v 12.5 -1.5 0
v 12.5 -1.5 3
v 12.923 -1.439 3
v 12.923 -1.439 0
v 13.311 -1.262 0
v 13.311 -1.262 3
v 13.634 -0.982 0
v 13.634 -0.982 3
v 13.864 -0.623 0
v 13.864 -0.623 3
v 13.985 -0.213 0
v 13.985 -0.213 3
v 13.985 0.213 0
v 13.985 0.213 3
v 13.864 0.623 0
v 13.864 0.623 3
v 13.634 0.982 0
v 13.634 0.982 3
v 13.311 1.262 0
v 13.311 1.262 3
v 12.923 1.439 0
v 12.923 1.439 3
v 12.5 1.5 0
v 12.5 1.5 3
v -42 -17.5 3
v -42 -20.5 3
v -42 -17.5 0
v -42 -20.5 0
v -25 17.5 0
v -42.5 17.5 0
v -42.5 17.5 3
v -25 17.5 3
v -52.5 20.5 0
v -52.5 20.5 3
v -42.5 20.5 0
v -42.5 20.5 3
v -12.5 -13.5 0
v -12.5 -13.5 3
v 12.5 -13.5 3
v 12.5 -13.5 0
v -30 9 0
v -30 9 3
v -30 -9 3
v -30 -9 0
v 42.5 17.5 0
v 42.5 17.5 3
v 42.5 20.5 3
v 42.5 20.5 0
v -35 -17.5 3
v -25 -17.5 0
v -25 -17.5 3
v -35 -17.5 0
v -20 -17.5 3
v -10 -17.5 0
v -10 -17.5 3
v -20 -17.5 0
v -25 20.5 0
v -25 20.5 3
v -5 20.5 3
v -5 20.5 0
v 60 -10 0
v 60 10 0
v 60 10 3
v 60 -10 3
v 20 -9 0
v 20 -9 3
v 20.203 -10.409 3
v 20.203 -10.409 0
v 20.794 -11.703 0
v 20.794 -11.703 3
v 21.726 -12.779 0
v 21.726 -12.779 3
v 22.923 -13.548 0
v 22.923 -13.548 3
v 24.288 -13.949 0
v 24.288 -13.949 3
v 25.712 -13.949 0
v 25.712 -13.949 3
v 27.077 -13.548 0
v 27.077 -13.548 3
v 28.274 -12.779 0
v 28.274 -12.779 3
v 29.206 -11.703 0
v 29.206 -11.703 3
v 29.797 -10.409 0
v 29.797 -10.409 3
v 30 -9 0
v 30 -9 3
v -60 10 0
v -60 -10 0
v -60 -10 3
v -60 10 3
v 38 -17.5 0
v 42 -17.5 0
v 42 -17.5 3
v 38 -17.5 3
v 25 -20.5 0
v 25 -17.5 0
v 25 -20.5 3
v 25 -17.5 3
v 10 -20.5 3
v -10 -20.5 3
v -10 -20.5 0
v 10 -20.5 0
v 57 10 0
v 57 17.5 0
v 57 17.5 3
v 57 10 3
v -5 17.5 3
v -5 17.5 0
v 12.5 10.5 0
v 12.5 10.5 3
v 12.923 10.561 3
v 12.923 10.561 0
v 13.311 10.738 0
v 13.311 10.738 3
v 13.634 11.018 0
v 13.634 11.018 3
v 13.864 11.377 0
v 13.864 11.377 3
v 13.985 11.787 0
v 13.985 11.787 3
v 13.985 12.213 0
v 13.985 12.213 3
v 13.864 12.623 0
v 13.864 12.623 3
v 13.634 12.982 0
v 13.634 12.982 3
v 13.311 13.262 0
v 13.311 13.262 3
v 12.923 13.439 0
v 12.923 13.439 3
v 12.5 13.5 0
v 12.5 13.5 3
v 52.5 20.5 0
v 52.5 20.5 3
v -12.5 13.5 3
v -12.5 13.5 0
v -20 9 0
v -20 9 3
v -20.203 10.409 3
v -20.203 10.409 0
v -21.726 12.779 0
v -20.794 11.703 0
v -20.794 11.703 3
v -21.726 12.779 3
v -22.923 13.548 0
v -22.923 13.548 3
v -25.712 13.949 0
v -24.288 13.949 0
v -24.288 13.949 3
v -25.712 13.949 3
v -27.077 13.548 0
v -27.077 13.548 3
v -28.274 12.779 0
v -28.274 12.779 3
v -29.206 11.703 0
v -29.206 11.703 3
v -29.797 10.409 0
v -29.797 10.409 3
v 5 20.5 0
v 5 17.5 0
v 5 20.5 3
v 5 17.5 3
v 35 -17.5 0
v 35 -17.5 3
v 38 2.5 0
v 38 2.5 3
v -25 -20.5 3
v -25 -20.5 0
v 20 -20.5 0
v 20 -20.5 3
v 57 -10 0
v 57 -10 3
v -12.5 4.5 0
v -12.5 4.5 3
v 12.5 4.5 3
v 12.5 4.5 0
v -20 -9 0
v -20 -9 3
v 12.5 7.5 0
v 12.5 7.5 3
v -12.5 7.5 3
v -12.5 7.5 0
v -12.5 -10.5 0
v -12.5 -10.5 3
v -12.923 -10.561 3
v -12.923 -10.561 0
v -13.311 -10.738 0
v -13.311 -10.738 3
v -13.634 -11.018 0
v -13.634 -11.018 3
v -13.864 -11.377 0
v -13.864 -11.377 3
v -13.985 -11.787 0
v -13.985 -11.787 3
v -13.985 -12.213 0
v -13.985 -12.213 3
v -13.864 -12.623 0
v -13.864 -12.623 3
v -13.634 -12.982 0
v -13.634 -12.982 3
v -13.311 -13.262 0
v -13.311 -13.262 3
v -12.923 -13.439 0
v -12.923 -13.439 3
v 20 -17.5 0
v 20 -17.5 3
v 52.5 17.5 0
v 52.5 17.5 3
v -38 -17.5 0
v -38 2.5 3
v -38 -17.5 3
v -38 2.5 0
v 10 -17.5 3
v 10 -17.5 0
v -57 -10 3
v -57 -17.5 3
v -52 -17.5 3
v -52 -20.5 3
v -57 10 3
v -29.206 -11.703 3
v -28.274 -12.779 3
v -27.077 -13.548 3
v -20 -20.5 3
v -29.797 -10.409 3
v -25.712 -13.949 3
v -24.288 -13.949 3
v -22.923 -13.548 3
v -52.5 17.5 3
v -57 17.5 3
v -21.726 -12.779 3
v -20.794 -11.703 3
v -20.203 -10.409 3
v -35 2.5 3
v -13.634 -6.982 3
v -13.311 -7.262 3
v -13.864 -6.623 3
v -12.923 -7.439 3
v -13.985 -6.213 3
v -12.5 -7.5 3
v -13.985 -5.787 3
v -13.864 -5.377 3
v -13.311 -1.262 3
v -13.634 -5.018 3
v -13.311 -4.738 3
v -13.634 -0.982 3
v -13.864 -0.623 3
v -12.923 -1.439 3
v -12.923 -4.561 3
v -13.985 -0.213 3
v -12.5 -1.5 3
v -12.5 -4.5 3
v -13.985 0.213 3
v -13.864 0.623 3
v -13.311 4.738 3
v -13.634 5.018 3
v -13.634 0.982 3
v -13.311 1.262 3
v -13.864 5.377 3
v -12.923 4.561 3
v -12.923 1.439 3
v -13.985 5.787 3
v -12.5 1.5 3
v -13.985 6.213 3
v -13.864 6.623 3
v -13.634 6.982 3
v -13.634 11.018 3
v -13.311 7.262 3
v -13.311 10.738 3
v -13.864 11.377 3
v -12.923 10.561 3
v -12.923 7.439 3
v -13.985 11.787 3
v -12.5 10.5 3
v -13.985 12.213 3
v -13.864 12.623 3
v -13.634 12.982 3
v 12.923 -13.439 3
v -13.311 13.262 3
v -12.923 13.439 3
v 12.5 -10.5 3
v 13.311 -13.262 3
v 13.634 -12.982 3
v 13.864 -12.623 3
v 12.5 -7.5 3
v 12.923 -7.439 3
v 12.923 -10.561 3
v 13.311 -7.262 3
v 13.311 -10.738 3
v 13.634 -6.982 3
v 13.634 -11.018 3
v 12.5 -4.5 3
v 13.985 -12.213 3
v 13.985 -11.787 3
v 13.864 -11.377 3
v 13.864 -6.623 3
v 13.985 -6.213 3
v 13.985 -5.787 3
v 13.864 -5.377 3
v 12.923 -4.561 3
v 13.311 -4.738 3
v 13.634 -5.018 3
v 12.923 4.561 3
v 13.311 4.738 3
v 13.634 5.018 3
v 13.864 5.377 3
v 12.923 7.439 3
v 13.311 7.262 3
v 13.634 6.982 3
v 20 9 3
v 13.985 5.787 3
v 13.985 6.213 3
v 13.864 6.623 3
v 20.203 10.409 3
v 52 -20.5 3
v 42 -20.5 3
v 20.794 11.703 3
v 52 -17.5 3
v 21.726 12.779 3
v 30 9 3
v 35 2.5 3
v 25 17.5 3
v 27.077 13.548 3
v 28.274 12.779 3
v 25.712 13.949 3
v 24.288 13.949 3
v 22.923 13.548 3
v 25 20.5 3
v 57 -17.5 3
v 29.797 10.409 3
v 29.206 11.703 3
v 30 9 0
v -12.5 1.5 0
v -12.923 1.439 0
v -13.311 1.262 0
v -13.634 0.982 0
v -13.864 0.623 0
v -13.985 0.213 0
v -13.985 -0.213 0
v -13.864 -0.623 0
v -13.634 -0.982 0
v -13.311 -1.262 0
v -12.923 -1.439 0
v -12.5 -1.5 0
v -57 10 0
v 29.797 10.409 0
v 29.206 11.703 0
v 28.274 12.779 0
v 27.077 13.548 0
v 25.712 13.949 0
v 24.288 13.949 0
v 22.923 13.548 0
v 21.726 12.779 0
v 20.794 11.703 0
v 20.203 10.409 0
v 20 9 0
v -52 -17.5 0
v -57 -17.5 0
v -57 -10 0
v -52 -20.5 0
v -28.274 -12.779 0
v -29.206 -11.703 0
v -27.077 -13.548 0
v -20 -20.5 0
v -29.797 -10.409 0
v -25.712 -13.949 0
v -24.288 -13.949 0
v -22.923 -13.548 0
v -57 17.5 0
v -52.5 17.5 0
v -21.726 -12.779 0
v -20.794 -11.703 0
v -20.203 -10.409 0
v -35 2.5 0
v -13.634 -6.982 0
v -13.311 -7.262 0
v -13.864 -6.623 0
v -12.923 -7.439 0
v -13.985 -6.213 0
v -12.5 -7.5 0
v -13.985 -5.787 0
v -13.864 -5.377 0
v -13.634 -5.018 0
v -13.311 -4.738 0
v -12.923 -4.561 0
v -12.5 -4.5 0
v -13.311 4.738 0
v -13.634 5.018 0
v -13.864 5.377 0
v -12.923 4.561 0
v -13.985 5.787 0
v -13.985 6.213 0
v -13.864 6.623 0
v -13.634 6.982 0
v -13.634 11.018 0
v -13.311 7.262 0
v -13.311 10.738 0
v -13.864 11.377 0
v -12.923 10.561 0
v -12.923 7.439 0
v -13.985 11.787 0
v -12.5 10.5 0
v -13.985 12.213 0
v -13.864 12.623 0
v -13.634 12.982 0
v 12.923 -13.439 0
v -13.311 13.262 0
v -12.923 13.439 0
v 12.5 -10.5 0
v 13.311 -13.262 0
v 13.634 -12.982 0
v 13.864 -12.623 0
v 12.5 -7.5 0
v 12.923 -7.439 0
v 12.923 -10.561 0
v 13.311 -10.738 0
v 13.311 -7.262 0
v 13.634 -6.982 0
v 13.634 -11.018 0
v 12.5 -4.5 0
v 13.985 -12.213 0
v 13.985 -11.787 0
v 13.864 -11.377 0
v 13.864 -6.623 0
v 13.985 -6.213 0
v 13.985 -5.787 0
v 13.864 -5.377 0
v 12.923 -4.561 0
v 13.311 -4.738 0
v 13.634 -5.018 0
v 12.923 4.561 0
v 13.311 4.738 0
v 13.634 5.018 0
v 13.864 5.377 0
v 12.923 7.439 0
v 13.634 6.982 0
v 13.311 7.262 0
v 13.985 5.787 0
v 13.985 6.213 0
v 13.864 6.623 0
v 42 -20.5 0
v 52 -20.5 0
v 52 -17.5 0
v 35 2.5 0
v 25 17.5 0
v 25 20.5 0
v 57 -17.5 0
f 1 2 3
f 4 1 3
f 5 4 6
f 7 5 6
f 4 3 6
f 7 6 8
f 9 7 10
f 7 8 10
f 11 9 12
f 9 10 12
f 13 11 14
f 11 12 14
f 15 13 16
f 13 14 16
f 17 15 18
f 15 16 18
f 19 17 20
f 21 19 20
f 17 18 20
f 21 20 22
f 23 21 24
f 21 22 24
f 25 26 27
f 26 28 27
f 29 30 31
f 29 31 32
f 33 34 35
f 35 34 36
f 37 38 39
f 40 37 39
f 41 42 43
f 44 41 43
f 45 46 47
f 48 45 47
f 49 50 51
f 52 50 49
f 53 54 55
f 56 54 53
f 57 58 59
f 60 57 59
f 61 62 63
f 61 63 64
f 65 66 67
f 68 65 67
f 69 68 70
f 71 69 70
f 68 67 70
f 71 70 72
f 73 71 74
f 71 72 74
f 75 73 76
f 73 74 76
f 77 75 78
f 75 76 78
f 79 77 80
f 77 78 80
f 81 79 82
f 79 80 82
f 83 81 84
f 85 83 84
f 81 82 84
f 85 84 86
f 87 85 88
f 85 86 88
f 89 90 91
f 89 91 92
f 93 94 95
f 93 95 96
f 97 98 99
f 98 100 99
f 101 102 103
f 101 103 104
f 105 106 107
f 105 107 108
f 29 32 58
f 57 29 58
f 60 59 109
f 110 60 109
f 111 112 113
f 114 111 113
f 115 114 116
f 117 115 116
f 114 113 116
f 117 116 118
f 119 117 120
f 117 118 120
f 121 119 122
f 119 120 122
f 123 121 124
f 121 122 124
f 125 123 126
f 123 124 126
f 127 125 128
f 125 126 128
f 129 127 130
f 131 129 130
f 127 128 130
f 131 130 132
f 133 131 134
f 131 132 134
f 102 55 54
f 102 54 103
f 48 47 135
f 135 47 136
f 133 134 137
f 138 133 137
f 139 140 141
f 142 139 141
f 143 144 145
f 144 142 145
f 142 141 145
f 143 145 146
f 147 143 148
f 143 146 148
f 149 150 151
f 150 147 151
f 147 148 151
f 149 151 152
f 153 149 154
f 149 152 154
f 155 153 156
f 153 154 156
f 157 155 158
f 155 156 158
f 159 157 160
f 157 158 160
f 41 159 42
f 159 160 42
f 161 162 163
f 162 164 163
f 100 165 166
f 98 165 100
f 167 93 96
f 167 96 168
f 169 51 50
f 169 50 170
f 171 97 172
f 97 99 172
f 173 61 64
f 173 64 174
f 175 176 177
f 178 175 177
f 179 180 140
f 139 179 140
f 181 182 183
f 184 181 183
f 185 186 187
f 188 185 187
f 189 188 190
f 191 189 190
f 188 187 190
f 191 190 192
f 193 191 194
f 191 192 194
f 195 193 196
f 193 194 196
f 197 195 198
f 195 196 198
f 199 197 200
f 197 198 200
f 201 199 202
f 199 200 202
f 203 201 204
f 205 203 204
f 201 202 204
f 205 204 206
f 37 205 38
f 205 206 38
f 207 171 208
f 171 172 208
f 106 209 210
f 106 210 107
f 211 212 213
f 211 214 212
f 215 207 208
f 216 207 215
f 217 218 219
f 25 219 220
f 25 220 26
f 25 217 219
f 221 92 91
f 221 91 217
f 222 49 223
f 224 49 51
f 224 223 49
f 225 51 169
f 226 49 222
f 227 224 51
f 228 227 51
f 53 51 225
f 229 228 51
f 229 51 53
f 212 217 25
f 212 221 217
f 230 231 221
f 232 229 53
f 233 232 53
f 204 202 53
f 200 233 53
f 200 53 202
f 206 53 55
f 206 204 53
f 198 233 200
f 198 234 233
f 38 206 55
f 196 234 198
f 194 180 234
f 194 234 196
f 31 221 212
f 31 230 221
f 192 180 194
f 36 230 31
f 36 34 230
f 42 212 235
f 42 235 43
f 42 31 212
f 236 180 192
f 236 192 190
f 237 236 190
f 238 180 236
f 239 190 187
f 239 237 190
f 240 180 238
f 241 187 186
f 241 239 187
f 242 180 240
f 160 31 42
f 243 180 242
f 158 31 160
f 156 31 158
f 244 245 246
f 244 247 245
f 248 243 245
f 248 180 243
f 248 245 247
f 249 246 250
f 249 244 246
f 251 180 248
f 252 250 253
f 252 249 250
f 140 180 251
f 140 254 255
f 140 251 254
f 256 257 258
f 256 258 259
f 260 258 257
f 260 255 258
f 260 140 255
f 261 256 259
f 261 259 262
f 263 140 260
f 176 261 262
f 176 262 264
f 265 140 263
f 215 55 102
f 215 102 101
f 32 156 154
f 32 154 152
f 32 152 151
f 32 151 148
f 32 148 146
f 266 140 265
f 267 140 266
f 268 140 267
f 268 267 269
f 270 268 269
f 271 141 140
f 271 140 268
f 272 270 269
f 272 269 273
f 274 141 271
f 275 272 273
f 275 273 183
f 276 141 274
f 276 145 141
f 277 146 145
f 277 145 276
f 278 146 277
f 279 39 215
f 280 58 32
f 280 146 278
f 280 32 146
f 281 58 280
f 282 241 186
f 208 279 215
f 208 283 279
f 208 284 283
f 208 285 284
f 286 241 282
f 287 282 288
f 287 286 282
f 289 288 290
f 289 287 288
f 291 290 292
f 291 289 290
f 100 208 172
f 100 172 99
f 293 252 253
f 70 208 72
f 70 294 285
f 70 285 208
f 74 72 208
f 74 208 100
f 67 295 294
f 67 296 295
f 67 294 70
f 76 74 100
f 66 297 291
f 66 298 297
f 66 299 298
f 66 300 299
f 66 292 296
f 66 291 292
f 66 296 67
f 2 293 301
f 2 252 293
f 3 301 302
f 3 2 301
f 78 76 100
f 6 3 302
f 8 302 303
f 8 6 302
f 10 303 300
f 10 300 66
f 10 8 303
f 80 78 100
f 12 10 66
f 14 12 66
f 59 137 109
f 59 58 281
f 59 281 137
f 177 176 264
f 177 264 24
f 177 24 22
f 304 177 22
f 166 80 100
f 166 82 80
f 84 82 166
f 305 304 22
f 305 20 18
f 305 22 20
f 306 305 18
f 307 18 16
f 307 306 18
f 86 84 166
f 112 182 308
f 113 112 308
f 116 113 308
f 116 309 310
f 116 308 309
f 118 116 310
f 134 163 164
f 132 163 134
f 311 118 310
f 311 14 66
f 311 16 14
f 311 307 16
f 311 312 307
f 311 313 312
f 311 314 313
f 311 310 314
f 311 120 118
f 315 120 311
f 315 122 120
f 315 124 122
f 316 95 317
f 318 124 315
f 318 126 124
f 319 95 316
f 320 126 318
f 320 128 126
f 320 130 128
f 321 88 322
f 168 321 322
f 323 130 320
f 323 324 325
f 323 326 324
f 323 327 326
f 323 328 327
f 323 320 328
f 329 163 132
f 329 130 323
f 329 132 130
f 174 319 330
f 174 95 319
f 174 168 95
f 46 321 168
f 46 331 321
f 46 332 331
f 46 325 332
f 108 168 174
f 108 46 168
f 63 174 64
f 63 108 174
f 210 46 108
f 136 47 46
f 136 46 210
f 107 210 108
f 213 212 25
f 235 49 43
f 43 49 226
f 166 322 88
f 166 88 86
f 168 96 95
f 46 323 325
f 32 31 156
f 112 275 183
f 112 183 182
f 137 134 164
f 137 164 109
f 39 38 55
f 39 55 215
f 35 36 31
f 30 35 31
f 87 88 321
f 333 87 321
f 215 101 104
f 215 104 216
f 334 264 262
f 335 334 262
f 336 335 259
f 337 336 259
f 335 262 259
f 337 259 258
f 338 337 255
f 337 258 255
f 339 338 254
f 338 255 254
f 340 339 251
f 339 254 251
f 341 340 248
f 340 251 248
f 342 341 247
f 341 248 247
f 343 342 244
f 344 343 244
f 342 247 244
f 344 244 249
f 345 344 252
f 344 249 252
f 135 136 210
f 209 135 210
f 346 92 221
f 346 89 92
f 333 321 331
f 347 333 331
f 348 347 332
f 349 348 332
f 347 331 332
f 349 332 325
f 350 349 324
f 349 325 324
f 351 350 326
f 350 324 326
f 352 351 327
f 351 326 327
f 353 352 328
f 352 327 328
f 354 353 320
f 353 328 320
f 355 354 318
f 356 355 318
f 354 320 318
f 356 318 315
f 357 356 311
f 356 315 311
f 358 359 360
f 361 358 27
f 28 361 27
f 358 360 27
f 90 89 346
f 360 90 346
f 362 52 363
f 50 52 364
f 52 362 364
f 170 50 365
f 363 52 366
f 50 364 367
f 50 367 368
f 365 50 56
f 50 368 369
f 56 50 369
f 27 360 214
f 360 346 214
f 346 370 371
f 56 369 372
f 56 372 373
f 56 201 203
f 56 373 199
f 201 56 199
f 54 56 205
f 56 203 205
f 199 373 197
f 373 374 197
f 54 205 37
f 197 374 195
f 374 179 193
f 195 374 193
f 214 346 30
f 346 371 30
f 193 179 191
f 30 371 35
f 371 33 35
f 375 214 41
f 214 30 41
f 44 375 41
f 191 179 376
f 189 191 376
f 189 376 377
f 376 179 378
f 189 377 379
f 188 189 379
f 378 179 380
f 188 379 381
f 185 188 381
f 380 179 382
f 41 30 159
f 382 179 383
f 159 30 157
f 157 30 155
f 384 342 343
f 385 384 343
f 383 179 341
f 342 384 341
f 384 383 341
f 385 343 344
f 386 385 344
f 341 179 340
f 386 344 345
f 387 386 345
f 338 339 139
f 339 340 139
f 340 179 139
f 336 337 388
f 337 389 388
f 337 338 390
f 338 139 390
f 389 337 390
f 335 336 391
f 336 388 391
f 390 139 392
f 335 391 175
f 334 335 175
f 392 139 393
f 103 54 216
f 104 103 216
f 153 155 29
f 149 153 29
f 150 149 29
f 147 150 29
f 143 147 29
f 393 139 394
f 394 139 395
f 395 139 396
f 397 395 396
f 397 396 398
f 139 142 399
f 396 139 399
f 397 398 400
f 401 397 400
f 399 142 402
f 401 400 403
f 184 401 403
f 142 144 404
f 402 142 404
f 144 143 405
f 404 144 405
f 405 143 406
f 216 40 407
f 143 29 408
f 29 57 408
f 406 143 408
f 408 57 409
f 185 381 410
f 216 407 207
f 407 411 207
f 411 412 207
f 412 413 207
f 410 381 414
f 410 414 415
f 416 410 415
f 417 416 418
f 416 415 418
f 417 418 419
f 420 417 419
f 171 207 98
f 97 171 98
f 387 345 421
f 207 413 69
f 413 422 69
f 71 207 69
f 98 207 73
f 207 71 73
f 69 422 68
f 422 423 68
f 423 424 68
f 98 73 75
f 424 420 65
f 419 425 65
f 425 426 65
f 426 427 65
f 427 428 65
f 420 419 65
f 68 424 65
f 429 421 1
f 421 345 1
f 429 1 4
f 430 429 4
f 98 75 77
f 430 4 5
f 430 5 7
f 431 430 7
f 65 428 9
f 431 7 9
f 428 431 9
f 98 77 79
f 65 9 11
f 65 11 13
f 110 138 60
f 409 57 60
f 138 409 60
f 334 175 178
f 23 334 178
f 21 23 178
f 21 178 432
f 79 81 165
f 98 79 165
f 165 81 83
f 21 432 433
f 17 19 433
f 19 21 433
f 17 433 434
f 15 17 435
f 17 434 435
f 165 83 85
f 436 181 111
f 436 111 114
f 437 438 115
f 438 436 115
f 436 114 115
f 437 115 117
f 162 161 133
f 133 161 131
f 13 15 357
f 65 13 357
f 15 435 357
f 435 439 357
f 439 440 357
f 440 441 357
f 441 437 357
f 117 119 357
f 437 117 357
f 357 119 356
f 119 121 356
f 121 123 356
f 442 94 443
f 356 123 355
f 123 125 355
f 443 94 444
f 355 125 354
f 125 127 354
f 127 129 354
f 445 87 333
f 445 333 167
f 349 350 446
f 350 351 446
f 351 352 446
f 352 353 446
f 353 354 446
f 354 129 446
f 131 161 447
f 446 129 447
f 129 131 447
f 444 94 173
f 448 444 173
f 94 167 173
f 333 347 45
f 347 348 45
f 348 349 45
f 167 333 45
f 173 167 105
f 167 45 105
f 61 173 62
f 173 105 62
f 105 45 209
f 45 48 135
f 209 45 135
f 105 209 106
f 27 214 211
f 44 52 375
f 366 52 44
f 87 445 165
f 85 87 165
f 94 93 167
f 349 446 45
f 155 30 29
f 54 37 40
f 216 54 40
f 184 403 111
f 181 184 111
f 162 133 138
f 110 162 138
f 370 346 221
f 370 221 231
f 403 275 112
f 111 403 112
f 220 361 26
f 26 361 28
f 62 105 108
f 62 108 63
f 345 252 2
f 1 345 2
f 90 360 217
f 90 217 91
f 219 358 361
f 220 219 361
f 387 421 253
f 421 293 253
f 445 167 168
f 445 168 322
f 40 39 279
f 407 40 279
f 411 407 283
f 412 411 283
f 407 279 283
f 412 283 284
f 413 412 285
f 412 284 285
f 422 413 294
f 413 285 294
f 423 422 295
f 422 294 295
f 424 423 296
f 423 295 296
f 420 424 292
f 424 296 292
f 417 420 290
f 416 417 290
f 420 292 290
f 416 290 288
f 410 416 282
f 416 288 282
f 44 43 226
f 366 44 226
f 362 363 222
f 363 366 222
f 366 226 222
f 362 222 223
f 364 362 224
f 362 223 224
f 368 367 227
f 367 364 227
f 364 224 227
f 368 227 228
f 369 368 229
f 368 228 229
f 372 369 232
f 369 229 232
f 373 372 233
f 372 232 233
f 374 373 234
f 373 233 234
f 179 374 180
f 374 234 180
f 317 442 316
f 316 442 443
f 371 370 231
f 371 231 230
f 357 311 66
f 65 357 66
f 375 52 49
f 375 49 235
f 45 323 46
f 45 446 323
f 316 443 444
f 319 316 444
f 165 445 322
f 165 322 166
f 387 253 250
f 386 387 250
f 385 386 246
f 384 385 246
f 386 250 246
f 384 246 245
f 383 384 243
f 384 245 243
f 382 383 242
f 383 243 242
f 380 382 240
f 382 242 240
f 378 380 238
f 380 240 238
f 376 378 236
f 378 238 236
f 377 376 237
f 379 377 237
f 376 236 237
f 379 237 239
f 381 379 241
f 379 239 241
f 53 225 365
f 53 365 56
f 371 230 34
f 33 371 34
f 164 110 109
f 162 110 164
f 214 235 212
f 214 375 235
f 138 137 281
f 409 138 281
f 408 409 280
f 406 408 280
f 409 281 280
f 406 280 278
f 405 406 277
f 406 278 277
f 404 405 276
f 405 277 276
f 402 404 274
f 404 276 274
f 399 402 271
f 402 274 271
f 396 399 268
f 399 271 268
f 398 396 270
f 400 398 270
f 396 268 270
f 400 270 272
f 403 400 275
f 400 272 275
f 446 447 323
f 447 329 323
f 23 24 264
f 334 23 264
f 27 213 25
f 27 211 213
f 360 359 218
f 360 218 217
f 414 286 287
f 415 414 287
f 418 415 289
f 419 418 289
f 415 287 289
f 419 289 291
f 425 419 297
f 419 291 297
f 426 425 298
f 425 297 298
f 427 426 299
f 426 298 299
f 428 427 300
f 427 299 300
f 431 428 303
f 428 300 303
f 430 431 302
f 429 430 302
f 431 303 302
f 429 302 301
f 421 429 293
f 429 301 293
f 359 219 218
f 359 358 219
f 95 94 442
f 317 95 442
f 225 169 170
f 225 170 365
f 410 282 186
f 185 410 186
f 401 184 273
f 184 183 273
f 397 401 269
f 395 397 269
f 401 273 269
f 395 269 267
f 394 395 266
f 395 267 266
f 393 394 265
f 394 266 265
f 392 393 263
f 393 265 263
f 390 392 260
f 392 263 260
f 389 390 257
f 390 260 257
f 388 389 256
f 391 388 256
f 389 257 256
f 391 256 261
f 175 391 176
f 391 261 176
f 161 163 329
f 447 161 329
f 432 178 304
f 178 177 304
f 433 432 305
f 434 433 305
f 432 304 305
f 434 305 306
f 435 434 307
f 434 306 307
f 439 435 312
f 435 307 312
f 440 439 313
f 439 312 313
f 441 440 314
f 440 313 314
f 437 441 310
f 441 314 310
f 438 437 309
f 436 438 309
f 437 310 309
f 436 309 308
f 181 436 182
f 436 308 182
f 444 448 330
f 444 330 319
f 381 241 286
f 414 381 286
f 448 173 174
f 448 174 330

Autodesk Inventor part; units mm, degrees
ref_plane "YZ Plane" through (0, 0, 0) normal (1, 0, 0) x (0, 1, 0)
ref_plane "XZ Plane" through (0, 0, 0) normal (0, 1, 0) x (-1, 0, 0)
ref_plane "XY Plane" through (0, 0, 0) normal (0, 0, 1) x (1, 0, 0)
sketch "Sketch1" plane through (0, 0, 0) normal (0, 0, 1) x (1, 0, 0)
  line L0 (57, -17.5) -> (-57, -17.5)
  line L1 (-57, -17.5) -> (-57, 17.5)
  line L2 (-57, 17.5) -> (57, 17.5)
  line L3 (57, 17.5) -> (57, -17.5)
  line L4 (57, -17.5) -> (-57, 17.5) construction
  line L5 (-57, -17.5) -> (57, 17.5) construction
  point P0 (0, 0)
  dimension "d0" = 114
  dimension "d1" = 35
extrude "Extrusion1" add sketch "Sketch1" along normal blind 3
sketch "Sketch2" plane through (0, 0, 3) normal (0, 0, 1) x (1, 0, 0)
  line L0 (-57, -17.5) -> (57, -17.5) projected
  line L1 (10, -17.5) -> (-10, -17.5)
  line L2 (-10, -17.5) -> (-10, -20.5)
  line L3 (-10, -20.5) -> (10, -20.5)
  line L4 (10, -20.5) -> (10, -17.5)
  line L5 (-20, -17.5) -> (-25, -17.5)
  line L6 (-25, -17.5) -> (-25, -20.5)
  line L7 (-25, -20.5) -> (-20, -20.5)
  line L8 (-20, -20.5) -> (-20, -17.5)
  line L9 (20, -17.5) -> (25, -17.5)
  line L10 (25, -17.5) -> (25, -20.5)
  line L11 (25, -20.5) -> (20, -20.5)
  line L12 (20, -20.5) -> (20, -17.5)
  point P0 (0, 0)
  point P1 (0, -20.5)
  dimension "d4" = 20
  dimension "d5" = 3
  dimension "d6" = 5
  dimension "d7" = 3
  dimension "d8" = 10
  dimension "d9" = 5
  dimension "d10" = 3
  dimension "d11" = 10
extrude "Extrusion2" add sketch "Sketch2" against normal blind 3
sketch "Sketch3" plane through (0, 0, 0) normal (0, 0, -1) x (-1, 0, 0)
  line L0 (57, -17.5) -> (25, -17.5) projected
  line L1 (38, -17.5) -> (35, -17.5)
  line L2 (35, -17.5) -> (35, 2.5)
  line L3 (35, 2.5) -> (38, 2.5)
  line L4 (38, 2.5) -> (38, -17.5)
  line L5 (-57, 17.5) -> (57, 17.5) projected
  point P0 (0, 0)
  dimension "d14" = 3
  dimension "d15" = 15
  dimension "d16" = 35
extrude "Extrusion3" cut sketch "Sketch3" against normal blind 3
sketch "Sketch4" plane through (0, 0, 0) normal (0, 0, -1) x (-1, 0, 0)
  line L0 (38, -17.5) -> (57, -17.5) projected
  line L1 (42, -17.5) -> (52, -17.5)
  line L2 (52, -17.5) -> (52, -20.5)
  line L3 (52, -20.5) -> (42, -20.5)
  line L4 (42, -20.5) -> (42, -17.5)
  line L5 (25, -20.5) -> (25, -17.5) projected
  point P0 (0, 0)
  dimension "d19" = 10
  dimension "d20" = 3
  dimension "d21" = 17
extrude "Extrusion4" add sketch "Sketch4" against normal blind 3
sketch "Sketch5" plane through (0, 0, 0) normal (0, 0, -1) x (-1, 0, 0)
  line L0 (57, 17.5) -> (57, -17.5) projected
  line L1 (57, -10) -> (60, -10)
  line L2 (60, -10) -> (60, 10)
  line L3 (60, 10) -> (57, 10)
  line L4 (57, 10) -> (57, -10)
  line L5 (52, -17.5) -> (57, -17.5) projected
  point P0 (0, 0)
  dimension "d24" = 3
  dimension "d25" = 20
  dimension "d26" = 7.5
extrude "Extrusion5" add sketch "Sketch5" against normal blind 3
mirror "Mirror1" about plane through (0, 0, 0) normal (1, 0, 0) of "Extrusion5", "Extrusion4", "Extrusion3"
sketch "Sketch6" plane through (0, 0, 3) normal (0, 0, 1) x (1, 0, 0)
  line L0 (-57, 17.5) -> (57, 17.5) projected
  line L1 (52.5, 17.5) -> (42.5, 17.5)
  line L2 (42.5, 17.5) -> (42.5, 20.5)
  line L3 (42.5, 20.5) -> (52.5, 20.5)
  line L4 (52.5, 20.5) -> (52.5, 17.5)
  line L5 (25, 17.5) -> (5, 17.5)
  line L6 (5, 17.5) -> (5, 20.5)
  line L7 (5, 20.5) -> (25, 20.5)
  line L8 (25, 20.5) -> (25, 17.5)
  point P0 (0, 0)
  dimension "d29" = 10
  dimension "d30" = 3
  dimension "d31" = 20
  dimension "d32" = 3
  dimension "d33" = 17.5
  dimension "d34" = 5
extrude "Extrusion6" add sketch "Sketch6" against normal blind 3
sketch "Sketch7" plane through (0, 0, 3) normal (0, 0, 1) x (1, 0, 0)
  line L0 (25, 9) -> (25, -9) construction
  line L1 (20, 9) -> (20, -9)
  line L2 (30, -9) -> (30, 9)
  arc A0 (30, 9) -> (20, 9) centre (25, 9) ccw
  arc A1 (20, -9) -> (30, -9) centre (25, -9) ccw
  point P0 (0, 0)
  point P1 (25, 0)
  dimension "d37" = 18
  dimension "d38" = 10
  dimension "d39" = 25
extrude "Extrusion7" cut sketch "Sketch7" against normal blind 3
sketch "Sketch8" plane through (0, 0, 3) normal (0, 0, 1) x (1, 0, 0)
  line L0 (12.5, 12) -> (-12.5, 12) construction
  line L1 (12.5, 13.5) -> (-12.5, 13.5)
  line L2 (-12.5, 10.5) -> (12.5, 10.5)
  arc A0 (12.5, 10.5) -> (12.5, 13.5) centre (12.5, 12) ccw
  arc A1 (-12.5, 13.5) -> (-12.5, 10.5) centre (-12.5, 12) ccw
  line L3 (-12.5, 6) -> (12.5, 6) construction
  line L4 (-12.5, 4.5) -> (12.5, 4.5)
  line L5 (12.5, 7.5) -> (-12.5, 7.5)
  arc A2 (-12.5, 7.5) -> (-12.5, 4.5) centre (-12.5, 6) ccw
  arc A3 (12.5, 4.5) -> (12.5, 7.5) centre (12.5, 6) ccw
  line L6 (-12.5, -6) -> (12.5, -6) construction
  line L7 (-12.5, -7.5) -> (12.5, -7.5)
  line L8 (12.5, -4.5) -> (-12.5, -4.5)
  arc A4 (-12.5, -4.5) -> (-12.5, -7.5) centre (-12.5, -6) ccw
  arc A5 (12.5, -7.5) -> (12.5, -4.5) centre (12.5, -6) ccw
  line L9 (-12.5, -12) -> (12.5, -12) construction
  line L10 (-12.5, -13.5) -> (12.5, -13.5)
  line L11 (12.5, -10.5) -> (-12.5, -10.5)
  arc A6 (-12.5, -10.5) -> (-12.5, -13.5) centre (-12.5, -12) ccw
  arc A7 (12.5, -13.5) -> (12.5, -10.5) centre (12.5, -12) ccw
  line L12 (-12.5, 0) -> (12.5, 0) construction
  line L13 (-12.5, -1.5) -> (12.5, -1.5)
  line L14 (12.5, 1.5) -> (-12.5, 1.5)
  arc A8 (-12.5, 1.5) -> (-12.5, -1.5) centre (-12.5, 0) ccw
  arc A9 (12.5, -1.5) -> (12.5, 1.5) centre (12.5, 0) ccw
  point P0 (0, 0)
  point P1 (0, 12)
  point P2 (0, 6)
  point P3 (0, -6)
  point P4 (0, -12)
  point P5 (0, 0)
  dimension "d42" = 3
  dimension "d43" = 12
  dimension "d44" = 3
  dimension "d45" = 3
  dimension "d46" = 3
  dimension "d47" = 12
  dimension "d48" = 6
  dimension "d49" = 6
  dimension "d50" = 3
  dimension "d51" = 25
extrude "Extrusion8" cut sketch "Sketch8" against normal blind 3
mirror "Mirror2" about plane through (0, 0, 0) normal (1, 0, 0) of "Extrusion6", "Extrusion7"
equation "\"d11\" = d8"
equation "\"d47\" = d43"
equation "\"d49\" = d48"
properties part number "Lower bottom"
